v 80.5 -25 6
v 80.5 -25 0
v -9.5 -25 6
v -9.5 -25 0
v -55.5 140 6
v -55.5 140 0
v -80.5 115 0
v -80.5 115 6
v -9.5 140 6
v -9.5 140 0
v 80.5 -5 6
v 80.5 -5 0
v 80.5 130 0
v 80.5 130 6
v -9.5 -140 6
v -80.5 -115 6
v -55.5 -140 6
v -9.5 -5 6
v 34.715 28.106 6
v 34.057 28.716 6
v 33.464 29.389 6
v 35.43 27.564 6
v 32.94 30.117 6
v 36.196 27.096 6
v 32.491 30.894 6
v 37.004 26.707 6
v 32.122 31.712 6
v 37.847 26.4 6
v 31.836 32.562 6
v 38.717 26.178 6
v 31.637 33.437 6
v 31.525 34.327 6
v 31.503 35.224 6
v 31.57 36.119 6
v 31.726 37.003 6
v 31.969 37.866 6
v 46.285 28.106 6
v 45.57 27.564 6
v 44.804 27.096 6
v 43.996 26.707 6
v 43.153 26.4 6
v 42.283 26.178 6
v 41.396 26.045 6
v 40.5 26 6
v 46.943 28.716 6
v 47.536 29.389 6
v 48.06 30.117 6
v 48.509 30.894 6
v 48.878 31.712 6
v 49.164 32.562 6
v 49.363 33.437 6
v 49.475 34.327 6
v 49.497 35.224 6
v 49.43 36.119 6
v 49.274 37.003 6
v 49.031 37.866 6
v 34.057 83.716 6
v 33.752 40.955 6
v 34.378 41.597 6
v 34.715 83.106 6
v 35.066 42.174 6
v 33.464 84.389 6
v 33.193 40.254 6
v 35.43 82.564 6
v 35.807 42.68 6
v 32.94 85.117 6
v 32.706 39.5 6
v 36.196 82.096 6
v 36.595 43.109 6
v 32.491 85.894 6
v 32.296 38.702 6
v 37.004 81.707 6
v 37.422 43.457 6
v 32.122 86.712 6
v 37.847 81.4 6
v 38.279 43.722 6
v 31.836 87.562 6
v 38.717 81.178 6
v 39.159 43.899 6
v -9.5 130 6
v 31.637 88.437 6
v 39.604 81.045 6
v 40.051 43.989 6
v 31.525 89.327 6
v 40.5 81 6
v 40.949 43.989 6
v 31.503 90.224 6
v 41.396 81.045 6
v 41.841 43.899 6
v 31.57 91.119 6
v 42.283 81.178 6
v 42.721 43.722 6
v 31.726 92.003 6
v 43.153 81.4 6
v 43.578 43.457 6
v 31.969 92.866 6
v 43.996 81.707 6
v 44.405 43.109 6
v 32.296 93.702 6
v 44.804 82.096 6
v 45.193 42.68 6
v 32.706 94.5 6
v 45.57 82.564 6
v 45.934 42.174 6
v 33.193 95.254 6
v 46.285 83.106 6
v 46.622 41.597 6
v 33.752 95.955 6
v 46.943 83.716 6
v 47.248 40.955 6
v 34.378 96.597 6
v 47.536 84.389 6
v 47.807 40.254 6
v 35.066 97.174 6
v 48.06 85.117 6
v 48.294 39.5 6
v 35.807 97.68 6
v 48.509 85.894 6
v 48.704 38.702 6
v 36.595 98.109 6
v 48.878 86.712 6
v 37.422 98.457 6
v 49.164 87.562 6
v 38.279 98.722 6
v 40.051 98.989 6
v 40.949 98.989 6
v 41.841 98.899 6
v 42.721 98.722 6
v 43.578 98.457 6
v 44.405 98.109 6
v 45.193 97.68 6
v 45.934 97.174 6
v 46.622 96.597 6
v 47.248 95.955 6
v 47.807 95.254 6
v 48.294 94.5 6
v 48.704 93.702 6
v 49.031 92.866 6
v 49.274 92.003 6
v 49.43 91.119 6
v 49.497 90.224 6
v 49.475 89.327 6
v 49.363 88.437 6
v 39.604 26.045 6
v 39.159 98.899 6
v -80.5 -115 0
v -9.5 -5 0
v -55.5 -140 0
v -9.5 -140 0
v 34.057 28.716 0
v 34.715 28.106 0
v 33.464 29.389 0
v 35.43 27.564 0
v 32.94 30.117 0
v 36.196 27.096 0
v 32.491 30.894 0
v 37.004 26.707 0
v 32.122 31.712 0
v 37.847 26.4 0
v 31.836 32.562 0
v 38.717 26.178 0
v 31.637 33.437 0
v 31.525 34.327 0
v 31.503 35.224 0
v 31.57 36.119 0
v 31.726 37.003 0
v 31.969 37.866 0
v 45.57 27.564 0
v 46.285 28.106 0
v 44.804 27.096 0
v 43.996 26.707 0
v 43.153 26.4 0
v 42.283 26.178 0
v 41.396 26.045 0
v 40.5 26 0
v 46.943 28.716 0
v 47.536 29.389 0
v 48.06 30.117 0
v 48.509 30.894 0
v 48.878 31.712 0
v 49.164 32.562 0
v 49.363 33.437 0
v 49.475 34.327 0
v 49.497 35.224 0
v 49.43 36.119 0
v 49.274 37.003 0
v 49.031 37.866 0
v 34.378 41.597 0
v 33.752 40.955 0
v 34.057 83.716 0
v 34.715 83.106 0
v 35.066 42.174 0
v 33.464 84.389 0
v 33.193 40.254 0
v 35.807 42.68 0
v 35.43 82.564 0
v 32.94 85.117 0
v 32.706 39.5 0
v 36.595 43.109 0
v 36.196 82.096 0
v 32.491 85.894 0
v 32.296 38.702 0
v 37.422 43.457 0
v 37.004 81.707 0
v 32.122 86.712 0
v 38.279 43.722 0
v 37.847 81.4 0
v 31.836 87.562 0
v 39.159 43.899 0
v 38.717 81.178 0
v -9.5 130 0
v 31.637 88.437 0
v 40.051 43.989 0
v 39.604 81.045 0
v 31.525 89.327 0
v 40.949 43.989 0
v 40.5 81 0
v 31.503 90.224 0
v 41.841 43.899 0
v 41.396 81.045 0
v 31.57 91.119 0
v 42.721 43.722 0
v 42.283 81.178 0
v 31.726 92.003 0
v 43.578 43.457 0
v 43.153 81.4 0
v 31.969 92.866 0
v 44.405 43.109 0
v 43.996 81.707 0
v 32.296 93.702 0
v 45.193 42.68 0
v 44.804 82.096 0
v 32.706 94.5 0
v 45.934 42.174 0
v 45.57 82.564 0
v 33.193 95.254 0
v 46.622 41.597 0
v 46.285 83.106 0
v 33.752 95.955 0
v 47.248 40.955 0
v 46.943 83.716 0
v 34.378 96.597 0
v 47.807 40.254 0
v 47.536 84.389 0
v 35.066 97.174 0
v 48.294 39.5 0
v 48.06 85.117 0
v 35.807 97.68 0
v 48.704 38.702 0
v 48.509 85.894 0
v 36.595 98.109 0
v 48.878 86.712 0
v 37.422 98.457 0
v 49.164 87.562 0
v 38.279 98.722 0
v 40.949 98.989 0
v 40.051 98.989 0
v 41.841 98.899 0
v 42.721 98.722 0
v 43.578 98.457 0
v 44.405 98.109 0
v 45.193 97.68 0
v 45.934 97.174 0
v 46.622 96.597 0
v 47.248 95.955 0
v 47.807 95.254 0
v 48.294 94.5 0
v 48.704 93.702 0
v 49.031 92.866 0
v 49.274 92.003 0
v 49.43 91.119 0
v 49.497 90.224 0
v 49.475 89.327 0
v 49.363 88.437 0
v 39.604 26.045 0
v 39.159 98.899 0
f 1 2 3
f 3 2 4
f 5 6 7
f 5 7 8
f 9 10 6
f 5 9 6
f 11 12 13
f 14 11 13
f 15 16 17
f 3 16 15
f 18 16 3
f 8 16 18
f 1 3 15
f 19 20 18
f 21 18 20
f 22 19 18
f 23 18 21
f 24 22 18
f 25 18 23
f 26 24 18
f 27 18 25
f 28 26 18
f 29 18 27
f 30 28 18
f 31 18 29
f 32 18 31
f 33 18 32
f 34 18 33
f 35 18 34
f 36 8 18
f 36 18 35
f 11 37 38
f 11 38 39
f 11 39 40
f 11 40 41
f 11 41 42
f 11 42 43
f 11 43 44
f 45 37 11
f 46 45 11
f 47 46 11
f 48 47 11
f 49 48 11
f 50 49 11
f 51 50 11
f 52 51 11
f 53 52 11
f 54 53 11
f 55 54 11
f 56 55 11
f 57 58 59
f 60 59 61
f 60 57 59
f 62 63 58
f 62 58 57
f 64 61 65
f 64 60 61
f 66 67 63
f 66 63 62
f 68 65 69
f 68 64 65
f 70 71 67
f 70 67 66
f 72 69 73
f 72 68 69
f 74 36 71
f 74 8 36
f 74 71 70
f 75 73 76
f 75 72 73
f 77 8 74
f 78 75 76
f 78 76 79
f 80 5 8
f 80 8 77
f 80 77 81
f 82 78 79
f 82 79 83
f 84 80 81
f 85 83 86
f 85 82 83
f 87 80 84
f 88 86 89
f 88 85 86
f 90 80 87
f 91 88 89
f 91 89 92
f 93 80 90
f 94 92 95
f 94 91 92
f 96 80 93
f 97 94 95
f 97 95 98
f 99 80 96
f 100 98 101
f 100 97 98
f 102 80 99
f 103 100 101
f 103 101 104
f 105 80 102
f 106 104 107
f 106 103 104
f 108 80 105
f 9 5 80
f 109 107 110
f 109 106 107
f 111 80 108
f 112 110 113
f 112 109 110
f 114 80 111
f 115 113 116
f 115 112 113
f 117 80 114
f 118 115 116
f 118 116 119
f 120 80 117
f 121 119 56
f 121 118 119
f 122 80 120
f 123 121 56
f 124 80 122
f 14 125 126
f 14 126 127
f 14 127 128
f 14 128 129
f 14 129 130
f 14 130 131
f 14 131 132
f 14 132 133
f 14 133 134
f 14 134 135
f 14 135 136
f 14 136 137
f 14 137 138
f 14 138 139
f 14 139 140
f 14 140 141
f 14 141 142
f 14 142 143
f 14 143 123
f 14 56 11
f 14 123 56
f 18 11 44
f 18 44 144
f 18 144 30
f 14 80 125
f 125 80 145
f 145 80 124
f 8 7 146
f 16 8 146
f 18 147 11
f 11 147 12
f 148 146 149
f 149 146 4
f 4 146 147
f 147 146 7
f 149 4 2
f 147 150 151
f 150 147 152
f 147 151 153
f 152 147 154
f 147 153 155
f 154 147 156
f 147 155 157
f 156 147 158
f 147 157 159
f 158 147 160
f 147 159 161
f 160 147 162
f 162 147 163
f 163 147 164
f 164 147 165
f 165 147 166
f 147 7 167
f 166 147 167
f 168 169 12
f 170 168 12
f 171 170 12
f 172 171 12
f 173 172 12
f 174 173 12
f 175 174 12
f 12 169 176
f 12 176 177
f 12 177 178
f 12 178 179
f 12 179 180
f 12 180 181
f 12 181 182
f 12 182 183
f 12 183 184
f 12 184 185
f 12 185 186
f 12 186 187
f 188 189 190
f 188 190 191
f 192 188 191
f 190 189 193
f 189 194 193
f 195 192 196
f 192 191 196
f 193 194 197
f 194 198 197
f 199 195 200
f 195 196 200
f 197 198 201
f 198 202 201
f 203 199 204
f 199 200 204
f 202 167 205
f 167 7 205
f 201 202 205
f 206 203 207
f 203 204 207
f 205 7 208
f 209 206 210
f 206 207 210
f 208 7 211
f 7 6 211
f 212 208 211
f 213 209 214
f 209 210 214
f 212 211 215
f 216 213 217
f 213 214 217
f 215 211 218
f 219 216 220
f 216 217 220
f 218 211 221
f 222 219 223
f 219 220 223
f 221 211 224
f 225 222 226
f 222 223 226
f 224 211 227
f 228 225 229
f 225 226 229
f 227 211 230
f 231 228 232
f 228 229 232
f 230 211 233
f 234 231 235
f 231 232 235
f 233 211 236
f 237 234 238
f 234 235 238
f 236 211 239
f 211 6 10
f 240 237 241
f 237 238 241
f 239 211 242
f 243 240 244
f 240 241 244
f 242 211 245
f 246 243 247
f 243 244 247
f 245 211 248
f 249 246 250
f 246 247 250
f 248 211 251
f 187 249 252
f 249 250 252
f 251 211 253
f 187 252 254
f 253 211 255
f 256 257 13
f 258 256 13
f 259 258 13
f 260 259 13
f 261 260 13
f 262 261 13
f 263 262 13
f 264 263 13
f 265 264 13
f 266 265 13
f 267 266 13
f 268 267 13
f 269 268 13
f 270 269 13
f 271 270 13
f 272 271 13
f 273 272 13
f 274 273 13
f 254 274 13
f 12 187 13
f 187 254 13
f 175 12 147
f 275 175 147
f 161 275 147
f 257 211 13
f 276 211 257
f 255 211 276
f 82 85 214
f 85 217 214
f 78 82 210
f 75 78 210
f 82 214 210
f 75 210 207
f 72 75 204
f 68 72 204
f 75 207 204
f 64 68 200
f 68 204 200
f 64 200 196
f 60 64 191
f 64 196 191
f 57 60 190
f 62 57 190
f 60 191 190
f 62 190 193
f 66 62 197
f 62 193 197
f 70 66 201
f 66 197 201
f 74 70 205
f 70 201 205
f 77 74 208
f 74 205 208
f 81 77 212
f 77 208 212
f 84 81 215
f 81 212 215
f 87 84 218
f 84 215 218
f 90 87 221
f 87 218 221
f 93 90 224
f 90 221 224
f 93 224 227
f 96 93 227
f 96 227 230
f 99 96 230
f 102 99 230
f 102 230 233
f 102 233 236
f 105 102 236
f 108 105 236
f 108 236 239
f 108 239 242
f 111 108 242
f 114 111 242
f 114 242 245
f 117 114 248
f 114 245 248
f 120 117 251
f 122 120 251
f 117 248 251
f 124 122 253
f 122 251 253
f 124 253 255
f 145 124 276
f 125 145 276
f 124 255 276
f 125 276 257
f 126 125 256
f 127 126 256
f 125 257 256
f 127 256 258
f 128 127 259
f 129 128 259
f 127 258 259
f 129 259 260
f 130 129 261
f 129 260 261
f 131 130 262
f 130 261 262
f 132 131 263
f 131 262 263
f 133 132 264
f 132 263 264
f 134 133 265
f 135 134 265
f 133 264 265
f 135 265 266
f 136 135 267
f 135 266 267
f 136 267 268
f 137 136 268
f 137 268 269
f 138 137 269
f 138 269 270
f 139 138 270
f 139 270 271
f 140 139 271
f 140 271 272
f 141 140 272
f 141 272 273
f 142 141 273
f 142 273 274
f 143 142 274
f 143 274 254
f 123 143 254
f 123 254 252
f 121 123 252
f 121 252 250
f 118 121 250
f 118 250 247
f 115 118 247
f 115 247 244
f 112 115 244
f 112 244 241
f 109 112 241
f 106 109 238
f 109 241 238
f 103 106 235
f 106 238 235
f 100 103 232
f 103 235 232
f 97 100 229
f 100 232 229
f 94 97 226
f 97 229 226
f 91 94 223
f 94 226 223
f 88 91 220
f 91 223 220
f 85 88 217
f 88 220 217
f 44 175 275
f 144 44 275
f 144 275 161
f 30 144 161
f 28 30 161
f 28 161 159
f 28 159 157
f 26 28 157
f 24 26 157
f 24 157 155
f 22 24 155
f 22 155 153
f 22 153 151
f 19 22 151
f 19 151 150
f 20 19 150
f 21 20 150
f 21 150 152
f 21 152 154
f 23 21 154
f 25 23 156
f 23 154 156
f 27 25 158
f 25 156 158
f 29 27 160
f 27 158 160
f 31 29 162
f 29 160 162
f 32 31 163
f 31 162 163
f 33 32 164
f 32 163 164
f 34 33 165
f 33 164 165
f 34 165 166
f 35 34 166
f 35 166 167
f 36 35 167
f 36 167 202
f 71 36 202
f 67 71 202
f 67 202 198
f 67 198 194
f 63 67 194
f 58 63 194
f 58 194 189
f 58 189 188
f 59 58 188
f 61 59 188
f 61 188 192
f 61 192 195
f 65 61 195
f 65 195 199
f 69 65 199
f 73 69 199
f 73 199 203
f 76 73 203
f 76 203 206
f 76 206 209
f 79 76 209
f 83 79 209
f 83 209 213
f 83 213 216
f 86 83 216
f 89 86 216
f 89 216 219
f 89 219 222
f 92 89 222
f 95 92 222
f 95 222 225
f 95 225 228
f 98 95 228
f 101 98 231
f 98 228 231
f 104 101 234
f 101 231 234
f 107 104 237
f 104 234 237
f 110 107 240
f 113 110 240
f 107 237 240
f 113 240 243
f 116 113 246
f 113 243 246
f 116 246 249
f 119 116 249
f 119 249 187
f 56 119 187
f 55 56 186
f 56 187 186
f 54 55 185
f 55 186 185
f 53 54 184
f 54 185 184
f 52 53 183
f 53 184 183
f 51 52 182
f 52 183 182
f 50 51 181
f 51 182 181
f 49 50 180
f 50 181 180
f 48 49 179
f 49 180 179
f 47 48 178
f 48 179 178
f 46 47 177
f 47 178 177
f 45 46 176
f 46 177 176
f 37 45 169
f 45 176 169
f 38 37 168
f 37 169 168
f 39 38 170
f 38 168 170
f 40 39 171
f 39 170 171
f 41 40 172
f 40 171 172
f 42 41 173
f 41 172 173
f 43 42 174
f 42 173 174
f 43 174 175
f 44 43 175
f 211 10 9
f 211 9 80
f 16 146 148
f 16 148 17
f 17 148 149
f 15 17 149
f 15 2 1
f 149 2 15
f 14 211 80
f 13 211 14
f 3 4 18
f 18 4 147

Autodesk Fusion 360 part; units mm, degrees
sketch "スケッチ1" plane through (0, 0, 0) normal (0, 0, 1) x (1, 0, 0)
  line L0 (-9.5, 140) -> (-80.5, 140)
  line L1 (-80.5, 140) -> (-80.5, -140)
  line L2 (-80.5, -140) -> (-9.5, -140)
  line L3 (80.5, -5) -> (80.5, 130)
  line L4 (-9.5, 140) -> (-9.5, 130)
  line L5 (-9.5, 130) -> (80.5, 130)
  line L6 (-80.5, -140) -> (-9.5, -140) construction
  line L7 (80.5, -25) -> (-9.5, -140)
  line L8 (80.5, -25) -> (-9.5, -25)
  line L9 (-9.5, -25) -> (-9.5, -5)
  line L10 (-9.5, -5) -> (80.5, -5)
  line L11 (-80.5, 140) -> (2.875, -5) construction
  line L12 (14.375, -25) -> (42.3815, -73.707) construction
  line L13 (74.75, 130) -> (-2.875, -5) construction
  line L14 (-9.5, -16.5217) -> (-80.5, -140) construction
  dimension "d2" = 280
  dimension "d5" = 71
  dimension "d7" = 90
  dimension "d8" = 20
extrude "押し出し1" add sketch "スケッチ1" along normal blind 6
chamfer "面取り1" distance 25 angle 45 2 edges at (-80.5, -140, 3) (-80.5, 140, 3)
sketch "スケッチ2" plane through (0, 0, 6) normal (0, 0, 1) x (-1, 0, 0)
  line L0 (55.5, -140) -> (80.5, -115)
  line L1 (80.5, -115) -> (80.5, 115)
  line L2 (80.5, 115) -> (55.5, 140)
  line L3 (55.5, 140) -> (9.5, 140)
  line L4 (9.5, 140) -> (-80.5, 25)
  line L5 (-80.5, 25) -> (9.5, 25)
  line L6 (9.5, 25) -> (9.5, 5)
  line L7 (9.5, 5) -> (-80.5, 5)
  line L8 (-80.5, 5) -> (-80.5, -130)
  line L9 (-80.5, -130) -> (9.5, -130)
  line L10 (9.5, -130) -> (9.5, -140)
  line L11 (9.5, -140) -> (55.5, -140)
  line L12 (-80.5, -130) -> (-40.5, -130) construction
  line L13 (-40.5, -130) -> (-40.5, -90) construction
  line L14 (-40.5, -90) -> (-80.5, -90) construction
  line L15 (-80.5, -90) -> (-80.5, -130) construction
  line L16 (-40.5, -90) -> (-40.5, -35) construction
  point P0 (-40.5, -90)
  point P1 (-40.5, -35)
  dimension "d12" = 40
  dimension "d13" = 40
  dimension "d14" = 55
hole "穴1" at (40.5, 90, 6) at (40.5, 35, 6) direction (0, 0, -1) diameter 18 end through all
equation "d5 = 25 mm + 46 mm"
